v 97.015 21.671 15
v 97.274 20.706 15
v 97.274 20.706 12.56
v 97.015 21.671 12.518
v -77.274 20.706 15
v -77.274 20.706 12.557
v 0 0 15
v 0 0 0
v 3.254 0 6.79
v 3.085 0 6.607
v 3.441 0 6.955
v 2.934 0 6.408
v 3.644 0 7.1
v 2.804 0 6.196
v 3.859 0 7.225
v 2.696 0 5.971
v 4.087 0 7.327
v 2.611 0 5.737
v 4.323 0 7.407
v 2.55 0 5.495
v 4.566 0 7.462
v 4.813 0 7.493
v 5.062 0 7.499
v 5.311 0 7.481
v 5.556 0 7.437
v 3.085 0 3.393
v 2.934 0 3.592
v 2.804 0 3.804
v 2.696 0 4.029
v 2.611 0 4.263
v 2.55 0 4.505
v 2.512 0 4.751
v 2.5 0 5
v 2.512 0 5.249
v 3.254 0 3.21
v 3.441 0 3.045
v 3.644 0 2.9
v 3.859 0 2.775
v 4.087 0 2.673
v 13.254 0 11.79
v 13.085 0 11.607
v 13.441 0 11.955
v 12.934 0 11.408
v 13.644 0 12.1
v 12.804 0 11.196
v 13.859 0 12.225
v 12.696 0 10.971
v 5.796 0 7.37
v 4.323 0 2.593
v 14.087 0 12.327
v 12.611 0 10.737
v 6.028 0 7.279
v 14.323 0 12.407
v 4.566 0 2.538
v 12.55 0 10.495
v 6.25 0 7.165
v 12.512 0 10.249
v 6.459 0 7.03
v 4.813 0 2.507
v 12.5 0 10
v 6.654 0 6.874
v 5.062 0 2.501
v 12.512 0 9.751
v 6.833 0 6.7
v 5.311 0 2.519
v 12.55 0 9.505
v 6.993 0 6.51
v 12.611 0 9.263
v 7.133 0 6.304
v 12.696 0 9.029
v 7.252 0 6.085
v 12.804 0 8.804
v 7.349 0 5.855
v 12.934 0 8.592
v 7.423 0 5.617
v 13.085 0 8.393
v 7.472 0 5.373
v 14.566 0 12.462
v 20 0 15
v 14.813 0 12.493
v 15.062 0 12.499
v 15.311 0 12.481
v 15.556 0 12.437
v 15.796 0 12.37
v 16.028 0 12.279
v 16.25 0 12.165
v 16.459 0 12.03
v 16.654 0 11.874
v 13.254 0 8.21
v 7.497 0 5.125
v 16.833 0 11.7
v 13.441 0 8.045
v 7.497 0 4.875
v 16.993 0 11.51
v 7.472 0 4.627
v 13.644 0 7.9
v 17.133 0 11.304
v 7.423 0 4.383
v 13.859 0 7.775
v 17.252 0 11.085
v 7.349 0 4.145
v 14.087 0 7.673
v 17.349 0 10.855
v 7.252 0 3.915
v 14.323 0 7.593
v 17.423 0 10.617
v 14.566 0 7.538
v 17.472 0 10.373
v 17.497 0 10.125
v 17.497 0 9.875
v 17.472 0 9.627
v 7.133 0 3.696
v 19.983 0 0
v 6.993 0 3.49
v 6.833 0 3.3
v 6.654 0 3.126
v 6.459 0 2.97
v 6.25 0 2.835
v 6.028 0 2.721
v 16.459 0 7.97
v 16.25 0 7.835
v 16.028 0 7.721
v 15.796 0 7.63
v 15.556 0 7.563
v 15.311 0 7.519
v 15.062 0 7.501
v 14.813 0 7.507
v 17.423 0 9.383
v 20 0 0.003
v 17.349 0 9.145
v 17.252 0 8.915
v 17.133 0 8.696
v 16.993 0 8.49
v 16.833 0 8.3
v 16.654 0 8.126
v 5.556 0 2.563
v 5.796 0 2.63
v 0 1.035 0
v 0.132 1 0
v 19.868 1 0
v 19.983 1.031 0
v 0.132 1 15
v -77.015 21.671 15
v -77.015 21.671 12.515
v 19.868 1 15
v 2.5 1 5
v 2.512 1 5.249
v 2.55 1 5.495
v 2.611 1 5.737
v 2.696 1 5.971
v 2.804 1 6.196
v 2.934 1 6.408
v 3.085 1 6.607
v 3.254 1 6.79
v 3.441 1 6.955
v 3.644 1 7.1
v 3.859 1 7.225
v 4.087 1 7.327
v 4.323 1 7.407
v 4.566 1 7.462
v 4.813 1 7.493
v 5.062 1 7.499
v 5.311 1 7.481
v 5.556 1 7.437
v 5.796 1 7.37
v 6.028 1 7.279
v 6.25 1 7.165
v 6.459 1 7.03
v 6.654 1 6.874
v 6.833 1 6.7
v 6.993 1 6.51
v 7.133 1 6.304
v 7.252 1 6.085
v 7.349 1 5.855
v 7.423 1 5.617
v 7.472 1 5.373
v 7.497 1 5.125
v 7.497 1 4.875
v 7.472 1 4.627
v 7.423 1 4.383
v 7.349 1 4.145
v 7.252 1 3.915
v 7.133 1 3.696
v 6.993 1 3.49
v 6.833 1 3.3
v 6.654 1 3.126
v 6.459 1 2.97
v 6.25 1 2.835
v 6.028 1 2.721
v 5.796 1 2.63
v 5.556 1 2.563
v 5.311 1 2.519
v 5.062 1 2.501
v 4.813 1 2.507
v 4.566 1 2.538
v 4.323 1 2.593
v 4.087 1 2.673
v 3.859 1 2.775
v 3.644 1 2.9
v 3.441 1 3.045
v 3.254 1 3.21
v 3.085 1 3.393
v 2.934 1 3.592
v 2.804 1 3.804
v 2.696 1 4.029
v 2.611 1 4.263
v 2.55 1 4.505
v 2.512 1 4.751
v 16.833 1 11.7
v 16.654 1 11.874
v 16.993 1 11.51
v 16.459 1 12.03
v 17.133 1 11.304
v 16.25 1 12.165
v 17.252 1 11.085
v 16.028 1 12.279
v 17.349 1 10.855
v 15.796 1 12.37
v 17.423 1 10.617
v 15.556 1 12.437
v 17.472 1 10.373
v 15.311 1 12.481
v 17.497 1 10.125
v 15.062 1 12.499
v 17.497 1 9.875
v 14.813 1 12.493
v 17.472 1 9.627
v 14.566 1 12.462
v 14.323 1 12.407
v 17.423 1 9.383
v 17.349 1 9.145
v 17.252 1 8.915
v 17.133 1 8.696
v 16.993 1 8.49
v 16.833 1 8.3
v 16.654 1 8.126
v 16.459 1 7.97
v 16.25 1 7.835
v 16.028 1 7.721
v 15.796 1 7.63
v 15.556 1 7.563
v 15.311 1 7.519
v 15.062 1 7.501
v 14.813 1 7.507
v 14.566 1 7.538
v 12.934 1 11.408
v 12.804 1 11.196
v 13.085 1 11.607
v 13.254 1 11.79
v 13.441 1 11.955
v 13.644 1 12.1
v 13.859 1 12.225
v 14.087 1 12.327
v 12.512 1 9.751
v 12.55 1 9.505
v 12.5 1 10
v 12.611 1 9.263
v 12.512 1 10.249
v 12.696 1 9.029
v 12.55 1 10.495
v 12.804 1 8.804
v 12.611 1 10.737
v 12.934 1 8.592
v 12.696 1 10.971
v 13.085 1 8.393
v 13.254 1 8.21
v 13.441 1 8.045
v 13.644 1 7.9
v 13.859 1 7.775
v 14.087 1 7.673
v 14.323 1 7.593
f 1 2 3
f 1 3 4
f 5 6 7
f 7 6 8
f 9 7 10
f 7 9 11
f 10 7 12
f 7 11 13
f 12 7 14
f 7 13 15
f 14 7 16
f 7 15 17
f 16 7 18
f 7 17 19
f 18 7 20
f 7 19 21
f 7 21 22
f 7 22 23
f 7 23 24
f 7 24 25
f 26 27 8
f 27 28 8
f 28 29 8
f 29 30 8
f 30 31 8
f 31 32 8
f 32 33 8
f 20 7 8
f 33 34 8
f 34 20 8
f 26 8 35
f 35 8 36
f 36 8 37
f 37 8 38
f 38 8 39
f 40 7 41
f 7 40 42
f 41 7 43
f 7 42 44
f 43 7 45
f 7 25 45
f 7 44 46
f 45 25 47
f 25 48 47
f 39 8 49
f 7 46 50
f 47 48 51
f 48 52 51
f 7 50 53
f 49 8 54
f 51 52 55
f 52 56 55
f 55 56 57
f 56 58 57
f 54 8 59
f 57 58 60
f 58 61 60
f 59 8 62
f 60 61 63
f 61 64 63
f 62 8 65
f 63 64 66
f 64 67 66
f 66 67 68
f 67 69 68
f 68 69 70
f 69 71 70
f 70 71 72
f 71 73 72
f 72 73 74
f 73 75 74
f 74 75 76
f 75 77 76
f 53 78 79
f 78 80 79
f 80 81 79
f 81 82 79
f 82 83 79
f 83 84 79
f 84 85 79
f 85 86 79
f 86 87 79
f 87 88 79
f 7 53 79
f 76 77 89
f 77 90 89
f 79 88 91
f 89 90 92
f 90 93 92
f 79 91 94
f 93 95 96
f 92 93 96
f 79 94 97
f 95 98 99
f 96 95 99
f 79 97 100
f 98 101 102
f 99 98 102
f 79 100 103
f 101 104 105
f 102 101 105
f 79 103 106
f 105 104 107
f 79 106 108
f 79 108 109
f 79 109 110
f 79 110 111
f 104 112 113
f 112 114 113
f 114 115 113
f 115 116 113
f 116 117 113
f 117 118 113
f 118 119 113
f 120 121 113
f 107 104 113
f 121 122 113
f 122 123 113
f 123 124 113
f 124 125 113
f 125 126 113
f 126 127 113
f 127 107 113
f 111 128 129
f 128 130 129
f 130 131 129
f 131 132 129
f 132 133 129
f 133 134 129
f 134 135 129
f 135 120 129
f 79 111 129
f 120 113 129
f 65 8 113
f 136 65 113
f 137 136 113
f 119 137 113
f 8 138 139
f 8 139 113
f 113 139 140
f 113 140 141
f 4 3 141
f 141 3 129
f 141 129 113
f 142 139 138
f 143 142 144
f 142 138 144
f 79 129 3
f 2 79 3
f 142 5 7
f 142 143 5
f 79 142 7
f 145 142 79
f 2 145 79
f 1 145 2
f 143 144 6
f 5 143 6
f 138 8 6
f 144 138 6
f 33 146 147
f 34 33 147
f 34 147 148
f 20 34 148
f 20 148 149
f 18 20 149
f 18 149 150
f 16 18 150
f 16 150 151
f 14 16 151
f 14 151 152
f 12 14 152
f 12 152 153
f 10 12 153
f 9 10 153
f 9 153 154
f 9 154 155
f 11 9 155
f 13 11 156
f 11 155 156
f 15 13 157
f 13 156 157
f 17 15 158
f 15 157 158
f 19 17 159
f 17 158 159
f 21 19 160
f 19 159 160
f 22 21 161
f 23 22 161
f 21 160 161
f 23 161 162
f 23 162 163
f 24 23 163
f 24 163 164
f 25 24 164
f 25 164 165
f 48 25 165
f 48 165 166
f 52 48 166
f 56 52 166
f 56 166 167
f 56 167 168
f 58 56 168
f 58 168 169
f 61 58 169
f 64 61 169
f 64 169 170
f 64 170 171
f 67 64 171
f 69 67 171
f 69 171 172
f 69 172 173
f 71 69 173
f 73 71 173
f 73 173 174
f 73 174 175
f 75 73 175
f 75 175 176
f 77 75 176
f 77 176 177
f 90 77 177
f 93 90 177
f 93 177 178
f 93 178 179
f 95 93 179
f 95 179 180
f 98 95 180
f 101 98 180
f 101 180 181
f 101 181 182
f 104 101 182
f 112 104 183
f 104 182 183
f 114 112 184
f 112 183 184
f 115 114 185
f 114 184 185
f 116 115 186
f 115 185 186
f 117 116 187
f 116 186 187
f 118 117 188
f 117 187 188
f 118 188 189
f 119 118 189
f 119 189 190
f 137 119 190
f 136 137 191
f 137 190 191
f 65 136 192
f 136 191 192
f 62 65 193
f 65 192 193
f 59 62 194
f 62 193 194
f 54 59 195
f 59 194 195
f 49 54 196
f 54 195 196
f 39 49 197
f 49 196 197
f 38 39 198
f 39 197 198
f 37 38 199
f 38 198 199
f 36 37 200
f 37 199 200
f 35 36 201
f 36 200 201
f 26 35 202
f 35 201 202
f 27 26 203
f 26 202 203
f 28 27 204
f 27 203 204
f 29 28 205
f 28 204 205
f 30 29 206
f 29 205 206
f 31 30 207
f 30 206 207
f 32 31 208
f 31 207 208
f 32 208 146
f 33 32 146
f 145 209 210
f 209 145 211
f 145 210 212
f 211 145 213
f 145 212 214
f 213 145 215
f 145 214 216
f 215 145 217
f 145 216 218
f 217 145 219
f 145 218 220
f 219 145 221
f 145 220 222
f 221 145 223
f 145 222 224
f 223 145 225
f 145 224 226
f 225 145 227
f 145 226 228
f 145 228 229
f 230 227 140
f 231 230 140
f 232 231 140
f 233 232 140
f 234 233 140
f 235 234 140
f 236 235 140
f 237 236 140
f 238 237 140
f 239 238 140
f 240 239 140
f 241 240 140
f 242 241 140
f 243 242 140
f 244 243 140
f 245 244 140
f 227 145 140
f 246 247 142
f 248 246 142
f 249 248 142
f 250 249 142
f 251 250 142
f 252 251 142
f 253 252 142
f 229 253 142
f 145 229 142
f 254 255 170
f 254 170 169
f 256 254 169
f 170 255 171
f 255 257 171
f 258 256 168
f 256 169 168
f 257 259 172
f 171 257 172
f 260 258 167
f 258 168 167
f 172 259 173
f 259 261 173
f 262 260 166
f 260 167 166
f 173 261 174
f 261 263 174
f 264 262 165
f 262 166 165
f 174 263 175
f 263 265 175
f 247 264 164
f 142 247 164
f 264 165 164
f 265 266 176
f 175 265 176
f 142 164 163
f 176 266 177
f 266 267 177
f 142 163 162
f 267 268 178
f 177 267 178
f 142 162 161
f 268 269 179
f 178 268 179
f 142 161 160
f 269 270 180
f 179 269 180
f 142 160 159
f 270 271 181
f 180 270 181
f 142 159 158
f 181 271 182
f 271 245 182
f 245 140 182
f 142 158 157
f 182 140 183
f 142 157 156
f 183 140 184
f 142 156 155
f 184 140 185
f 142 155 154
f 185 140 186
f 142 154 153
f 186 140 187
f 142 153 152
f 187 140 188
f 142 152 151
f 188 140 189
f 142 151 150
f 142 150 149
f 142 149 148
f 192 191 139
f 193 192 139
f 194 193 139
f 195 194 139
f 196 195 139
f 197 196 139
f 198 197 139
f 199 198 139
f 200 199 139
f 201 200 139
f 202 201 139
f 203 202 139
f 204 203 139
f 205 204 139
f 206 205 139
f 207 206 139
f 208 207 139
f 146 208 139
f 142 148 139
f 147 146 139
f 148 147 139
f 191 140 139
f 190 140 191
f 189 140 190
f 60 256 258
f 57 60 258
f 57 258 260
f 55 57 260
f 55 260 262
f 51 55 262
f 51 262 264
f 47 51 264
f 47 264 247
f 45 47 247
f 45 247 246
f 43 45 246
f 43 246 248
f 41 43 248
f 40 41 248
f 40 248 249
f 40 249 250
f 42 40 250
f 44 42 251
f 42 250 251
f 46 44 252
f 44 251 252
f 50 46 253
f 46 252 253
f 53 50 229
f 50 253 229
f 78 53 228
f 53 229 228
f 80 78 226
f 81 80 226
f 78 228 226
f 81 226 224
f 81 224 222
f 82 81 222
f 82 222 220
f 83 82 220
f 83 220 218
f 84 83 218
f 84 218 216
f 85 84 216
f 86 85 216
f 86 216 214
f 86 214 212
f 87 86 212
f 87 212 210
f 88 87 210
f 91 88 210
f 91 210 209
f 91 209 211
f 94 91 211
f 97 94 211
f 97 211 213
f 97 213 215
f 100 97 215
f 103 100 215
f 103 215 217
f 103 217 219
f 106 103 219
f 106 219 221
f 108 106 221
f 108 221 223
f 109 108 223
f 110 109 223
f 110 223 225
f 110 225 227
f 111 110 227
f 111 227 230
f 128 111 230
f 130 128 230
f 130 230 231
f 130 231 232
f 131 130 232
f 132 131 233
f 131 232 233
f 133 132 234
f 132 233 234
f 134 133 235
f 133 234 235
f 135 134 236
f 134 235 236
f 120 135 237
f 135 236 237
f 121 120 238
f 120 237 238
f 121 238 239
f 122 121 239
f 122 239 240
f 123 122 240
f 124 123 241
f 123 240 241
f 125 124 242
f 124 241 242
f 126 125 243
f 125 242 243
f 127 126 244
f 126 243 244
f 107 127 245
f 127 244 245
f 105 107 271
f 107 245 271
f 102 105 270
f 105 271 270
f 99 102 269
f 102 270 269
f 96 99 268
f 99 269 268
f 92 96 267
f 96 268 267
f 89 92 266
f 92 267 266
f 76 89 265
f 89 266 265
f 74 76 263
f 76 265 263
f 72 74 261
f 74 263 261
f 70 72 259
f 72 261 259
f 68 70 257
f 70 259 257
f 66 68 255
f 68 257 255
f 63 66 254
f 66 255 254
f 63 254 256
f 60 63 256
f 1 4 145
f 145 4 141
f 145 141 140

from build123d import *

# Parameters (mm, degrees)
F1_DEPTH = 15
F3_DEPTH = 21.672449
F5_D     = 5


with BuildPart() as f1:
    # F0 (on Top) → F1 (new body)
    with BuildSketch(Plane.XY):
        Polygon((-77.274066, 20.705524), (0, 0), (20, 0), (97.274066, 20.705524), (97.015247, 21.671449), (19.868348, 1), (0.131652, 1), (-77.015247, 21.671449), align=None)
    extrude(amount=F1_DEPTH)

    # F2 (on Front) → F3 (cut, through all)
    with BuildSketch(Plane.XZ):
        Polygon((-80, 0), (0, 0), (-80, 13), align=None)
        Polygon((99.983092, 13), (19.983092, 0), (99.983092, 0), align=None)
    extrude(amount=-F3_DEPTH, mode=Mode.SUBTRACT)

    # F5 (through all)
    with Locations(Plane.XZ):
        with Locations((5, 5), (15, 10)):
            Hole(F5_D / 2)


solid = f1.part
